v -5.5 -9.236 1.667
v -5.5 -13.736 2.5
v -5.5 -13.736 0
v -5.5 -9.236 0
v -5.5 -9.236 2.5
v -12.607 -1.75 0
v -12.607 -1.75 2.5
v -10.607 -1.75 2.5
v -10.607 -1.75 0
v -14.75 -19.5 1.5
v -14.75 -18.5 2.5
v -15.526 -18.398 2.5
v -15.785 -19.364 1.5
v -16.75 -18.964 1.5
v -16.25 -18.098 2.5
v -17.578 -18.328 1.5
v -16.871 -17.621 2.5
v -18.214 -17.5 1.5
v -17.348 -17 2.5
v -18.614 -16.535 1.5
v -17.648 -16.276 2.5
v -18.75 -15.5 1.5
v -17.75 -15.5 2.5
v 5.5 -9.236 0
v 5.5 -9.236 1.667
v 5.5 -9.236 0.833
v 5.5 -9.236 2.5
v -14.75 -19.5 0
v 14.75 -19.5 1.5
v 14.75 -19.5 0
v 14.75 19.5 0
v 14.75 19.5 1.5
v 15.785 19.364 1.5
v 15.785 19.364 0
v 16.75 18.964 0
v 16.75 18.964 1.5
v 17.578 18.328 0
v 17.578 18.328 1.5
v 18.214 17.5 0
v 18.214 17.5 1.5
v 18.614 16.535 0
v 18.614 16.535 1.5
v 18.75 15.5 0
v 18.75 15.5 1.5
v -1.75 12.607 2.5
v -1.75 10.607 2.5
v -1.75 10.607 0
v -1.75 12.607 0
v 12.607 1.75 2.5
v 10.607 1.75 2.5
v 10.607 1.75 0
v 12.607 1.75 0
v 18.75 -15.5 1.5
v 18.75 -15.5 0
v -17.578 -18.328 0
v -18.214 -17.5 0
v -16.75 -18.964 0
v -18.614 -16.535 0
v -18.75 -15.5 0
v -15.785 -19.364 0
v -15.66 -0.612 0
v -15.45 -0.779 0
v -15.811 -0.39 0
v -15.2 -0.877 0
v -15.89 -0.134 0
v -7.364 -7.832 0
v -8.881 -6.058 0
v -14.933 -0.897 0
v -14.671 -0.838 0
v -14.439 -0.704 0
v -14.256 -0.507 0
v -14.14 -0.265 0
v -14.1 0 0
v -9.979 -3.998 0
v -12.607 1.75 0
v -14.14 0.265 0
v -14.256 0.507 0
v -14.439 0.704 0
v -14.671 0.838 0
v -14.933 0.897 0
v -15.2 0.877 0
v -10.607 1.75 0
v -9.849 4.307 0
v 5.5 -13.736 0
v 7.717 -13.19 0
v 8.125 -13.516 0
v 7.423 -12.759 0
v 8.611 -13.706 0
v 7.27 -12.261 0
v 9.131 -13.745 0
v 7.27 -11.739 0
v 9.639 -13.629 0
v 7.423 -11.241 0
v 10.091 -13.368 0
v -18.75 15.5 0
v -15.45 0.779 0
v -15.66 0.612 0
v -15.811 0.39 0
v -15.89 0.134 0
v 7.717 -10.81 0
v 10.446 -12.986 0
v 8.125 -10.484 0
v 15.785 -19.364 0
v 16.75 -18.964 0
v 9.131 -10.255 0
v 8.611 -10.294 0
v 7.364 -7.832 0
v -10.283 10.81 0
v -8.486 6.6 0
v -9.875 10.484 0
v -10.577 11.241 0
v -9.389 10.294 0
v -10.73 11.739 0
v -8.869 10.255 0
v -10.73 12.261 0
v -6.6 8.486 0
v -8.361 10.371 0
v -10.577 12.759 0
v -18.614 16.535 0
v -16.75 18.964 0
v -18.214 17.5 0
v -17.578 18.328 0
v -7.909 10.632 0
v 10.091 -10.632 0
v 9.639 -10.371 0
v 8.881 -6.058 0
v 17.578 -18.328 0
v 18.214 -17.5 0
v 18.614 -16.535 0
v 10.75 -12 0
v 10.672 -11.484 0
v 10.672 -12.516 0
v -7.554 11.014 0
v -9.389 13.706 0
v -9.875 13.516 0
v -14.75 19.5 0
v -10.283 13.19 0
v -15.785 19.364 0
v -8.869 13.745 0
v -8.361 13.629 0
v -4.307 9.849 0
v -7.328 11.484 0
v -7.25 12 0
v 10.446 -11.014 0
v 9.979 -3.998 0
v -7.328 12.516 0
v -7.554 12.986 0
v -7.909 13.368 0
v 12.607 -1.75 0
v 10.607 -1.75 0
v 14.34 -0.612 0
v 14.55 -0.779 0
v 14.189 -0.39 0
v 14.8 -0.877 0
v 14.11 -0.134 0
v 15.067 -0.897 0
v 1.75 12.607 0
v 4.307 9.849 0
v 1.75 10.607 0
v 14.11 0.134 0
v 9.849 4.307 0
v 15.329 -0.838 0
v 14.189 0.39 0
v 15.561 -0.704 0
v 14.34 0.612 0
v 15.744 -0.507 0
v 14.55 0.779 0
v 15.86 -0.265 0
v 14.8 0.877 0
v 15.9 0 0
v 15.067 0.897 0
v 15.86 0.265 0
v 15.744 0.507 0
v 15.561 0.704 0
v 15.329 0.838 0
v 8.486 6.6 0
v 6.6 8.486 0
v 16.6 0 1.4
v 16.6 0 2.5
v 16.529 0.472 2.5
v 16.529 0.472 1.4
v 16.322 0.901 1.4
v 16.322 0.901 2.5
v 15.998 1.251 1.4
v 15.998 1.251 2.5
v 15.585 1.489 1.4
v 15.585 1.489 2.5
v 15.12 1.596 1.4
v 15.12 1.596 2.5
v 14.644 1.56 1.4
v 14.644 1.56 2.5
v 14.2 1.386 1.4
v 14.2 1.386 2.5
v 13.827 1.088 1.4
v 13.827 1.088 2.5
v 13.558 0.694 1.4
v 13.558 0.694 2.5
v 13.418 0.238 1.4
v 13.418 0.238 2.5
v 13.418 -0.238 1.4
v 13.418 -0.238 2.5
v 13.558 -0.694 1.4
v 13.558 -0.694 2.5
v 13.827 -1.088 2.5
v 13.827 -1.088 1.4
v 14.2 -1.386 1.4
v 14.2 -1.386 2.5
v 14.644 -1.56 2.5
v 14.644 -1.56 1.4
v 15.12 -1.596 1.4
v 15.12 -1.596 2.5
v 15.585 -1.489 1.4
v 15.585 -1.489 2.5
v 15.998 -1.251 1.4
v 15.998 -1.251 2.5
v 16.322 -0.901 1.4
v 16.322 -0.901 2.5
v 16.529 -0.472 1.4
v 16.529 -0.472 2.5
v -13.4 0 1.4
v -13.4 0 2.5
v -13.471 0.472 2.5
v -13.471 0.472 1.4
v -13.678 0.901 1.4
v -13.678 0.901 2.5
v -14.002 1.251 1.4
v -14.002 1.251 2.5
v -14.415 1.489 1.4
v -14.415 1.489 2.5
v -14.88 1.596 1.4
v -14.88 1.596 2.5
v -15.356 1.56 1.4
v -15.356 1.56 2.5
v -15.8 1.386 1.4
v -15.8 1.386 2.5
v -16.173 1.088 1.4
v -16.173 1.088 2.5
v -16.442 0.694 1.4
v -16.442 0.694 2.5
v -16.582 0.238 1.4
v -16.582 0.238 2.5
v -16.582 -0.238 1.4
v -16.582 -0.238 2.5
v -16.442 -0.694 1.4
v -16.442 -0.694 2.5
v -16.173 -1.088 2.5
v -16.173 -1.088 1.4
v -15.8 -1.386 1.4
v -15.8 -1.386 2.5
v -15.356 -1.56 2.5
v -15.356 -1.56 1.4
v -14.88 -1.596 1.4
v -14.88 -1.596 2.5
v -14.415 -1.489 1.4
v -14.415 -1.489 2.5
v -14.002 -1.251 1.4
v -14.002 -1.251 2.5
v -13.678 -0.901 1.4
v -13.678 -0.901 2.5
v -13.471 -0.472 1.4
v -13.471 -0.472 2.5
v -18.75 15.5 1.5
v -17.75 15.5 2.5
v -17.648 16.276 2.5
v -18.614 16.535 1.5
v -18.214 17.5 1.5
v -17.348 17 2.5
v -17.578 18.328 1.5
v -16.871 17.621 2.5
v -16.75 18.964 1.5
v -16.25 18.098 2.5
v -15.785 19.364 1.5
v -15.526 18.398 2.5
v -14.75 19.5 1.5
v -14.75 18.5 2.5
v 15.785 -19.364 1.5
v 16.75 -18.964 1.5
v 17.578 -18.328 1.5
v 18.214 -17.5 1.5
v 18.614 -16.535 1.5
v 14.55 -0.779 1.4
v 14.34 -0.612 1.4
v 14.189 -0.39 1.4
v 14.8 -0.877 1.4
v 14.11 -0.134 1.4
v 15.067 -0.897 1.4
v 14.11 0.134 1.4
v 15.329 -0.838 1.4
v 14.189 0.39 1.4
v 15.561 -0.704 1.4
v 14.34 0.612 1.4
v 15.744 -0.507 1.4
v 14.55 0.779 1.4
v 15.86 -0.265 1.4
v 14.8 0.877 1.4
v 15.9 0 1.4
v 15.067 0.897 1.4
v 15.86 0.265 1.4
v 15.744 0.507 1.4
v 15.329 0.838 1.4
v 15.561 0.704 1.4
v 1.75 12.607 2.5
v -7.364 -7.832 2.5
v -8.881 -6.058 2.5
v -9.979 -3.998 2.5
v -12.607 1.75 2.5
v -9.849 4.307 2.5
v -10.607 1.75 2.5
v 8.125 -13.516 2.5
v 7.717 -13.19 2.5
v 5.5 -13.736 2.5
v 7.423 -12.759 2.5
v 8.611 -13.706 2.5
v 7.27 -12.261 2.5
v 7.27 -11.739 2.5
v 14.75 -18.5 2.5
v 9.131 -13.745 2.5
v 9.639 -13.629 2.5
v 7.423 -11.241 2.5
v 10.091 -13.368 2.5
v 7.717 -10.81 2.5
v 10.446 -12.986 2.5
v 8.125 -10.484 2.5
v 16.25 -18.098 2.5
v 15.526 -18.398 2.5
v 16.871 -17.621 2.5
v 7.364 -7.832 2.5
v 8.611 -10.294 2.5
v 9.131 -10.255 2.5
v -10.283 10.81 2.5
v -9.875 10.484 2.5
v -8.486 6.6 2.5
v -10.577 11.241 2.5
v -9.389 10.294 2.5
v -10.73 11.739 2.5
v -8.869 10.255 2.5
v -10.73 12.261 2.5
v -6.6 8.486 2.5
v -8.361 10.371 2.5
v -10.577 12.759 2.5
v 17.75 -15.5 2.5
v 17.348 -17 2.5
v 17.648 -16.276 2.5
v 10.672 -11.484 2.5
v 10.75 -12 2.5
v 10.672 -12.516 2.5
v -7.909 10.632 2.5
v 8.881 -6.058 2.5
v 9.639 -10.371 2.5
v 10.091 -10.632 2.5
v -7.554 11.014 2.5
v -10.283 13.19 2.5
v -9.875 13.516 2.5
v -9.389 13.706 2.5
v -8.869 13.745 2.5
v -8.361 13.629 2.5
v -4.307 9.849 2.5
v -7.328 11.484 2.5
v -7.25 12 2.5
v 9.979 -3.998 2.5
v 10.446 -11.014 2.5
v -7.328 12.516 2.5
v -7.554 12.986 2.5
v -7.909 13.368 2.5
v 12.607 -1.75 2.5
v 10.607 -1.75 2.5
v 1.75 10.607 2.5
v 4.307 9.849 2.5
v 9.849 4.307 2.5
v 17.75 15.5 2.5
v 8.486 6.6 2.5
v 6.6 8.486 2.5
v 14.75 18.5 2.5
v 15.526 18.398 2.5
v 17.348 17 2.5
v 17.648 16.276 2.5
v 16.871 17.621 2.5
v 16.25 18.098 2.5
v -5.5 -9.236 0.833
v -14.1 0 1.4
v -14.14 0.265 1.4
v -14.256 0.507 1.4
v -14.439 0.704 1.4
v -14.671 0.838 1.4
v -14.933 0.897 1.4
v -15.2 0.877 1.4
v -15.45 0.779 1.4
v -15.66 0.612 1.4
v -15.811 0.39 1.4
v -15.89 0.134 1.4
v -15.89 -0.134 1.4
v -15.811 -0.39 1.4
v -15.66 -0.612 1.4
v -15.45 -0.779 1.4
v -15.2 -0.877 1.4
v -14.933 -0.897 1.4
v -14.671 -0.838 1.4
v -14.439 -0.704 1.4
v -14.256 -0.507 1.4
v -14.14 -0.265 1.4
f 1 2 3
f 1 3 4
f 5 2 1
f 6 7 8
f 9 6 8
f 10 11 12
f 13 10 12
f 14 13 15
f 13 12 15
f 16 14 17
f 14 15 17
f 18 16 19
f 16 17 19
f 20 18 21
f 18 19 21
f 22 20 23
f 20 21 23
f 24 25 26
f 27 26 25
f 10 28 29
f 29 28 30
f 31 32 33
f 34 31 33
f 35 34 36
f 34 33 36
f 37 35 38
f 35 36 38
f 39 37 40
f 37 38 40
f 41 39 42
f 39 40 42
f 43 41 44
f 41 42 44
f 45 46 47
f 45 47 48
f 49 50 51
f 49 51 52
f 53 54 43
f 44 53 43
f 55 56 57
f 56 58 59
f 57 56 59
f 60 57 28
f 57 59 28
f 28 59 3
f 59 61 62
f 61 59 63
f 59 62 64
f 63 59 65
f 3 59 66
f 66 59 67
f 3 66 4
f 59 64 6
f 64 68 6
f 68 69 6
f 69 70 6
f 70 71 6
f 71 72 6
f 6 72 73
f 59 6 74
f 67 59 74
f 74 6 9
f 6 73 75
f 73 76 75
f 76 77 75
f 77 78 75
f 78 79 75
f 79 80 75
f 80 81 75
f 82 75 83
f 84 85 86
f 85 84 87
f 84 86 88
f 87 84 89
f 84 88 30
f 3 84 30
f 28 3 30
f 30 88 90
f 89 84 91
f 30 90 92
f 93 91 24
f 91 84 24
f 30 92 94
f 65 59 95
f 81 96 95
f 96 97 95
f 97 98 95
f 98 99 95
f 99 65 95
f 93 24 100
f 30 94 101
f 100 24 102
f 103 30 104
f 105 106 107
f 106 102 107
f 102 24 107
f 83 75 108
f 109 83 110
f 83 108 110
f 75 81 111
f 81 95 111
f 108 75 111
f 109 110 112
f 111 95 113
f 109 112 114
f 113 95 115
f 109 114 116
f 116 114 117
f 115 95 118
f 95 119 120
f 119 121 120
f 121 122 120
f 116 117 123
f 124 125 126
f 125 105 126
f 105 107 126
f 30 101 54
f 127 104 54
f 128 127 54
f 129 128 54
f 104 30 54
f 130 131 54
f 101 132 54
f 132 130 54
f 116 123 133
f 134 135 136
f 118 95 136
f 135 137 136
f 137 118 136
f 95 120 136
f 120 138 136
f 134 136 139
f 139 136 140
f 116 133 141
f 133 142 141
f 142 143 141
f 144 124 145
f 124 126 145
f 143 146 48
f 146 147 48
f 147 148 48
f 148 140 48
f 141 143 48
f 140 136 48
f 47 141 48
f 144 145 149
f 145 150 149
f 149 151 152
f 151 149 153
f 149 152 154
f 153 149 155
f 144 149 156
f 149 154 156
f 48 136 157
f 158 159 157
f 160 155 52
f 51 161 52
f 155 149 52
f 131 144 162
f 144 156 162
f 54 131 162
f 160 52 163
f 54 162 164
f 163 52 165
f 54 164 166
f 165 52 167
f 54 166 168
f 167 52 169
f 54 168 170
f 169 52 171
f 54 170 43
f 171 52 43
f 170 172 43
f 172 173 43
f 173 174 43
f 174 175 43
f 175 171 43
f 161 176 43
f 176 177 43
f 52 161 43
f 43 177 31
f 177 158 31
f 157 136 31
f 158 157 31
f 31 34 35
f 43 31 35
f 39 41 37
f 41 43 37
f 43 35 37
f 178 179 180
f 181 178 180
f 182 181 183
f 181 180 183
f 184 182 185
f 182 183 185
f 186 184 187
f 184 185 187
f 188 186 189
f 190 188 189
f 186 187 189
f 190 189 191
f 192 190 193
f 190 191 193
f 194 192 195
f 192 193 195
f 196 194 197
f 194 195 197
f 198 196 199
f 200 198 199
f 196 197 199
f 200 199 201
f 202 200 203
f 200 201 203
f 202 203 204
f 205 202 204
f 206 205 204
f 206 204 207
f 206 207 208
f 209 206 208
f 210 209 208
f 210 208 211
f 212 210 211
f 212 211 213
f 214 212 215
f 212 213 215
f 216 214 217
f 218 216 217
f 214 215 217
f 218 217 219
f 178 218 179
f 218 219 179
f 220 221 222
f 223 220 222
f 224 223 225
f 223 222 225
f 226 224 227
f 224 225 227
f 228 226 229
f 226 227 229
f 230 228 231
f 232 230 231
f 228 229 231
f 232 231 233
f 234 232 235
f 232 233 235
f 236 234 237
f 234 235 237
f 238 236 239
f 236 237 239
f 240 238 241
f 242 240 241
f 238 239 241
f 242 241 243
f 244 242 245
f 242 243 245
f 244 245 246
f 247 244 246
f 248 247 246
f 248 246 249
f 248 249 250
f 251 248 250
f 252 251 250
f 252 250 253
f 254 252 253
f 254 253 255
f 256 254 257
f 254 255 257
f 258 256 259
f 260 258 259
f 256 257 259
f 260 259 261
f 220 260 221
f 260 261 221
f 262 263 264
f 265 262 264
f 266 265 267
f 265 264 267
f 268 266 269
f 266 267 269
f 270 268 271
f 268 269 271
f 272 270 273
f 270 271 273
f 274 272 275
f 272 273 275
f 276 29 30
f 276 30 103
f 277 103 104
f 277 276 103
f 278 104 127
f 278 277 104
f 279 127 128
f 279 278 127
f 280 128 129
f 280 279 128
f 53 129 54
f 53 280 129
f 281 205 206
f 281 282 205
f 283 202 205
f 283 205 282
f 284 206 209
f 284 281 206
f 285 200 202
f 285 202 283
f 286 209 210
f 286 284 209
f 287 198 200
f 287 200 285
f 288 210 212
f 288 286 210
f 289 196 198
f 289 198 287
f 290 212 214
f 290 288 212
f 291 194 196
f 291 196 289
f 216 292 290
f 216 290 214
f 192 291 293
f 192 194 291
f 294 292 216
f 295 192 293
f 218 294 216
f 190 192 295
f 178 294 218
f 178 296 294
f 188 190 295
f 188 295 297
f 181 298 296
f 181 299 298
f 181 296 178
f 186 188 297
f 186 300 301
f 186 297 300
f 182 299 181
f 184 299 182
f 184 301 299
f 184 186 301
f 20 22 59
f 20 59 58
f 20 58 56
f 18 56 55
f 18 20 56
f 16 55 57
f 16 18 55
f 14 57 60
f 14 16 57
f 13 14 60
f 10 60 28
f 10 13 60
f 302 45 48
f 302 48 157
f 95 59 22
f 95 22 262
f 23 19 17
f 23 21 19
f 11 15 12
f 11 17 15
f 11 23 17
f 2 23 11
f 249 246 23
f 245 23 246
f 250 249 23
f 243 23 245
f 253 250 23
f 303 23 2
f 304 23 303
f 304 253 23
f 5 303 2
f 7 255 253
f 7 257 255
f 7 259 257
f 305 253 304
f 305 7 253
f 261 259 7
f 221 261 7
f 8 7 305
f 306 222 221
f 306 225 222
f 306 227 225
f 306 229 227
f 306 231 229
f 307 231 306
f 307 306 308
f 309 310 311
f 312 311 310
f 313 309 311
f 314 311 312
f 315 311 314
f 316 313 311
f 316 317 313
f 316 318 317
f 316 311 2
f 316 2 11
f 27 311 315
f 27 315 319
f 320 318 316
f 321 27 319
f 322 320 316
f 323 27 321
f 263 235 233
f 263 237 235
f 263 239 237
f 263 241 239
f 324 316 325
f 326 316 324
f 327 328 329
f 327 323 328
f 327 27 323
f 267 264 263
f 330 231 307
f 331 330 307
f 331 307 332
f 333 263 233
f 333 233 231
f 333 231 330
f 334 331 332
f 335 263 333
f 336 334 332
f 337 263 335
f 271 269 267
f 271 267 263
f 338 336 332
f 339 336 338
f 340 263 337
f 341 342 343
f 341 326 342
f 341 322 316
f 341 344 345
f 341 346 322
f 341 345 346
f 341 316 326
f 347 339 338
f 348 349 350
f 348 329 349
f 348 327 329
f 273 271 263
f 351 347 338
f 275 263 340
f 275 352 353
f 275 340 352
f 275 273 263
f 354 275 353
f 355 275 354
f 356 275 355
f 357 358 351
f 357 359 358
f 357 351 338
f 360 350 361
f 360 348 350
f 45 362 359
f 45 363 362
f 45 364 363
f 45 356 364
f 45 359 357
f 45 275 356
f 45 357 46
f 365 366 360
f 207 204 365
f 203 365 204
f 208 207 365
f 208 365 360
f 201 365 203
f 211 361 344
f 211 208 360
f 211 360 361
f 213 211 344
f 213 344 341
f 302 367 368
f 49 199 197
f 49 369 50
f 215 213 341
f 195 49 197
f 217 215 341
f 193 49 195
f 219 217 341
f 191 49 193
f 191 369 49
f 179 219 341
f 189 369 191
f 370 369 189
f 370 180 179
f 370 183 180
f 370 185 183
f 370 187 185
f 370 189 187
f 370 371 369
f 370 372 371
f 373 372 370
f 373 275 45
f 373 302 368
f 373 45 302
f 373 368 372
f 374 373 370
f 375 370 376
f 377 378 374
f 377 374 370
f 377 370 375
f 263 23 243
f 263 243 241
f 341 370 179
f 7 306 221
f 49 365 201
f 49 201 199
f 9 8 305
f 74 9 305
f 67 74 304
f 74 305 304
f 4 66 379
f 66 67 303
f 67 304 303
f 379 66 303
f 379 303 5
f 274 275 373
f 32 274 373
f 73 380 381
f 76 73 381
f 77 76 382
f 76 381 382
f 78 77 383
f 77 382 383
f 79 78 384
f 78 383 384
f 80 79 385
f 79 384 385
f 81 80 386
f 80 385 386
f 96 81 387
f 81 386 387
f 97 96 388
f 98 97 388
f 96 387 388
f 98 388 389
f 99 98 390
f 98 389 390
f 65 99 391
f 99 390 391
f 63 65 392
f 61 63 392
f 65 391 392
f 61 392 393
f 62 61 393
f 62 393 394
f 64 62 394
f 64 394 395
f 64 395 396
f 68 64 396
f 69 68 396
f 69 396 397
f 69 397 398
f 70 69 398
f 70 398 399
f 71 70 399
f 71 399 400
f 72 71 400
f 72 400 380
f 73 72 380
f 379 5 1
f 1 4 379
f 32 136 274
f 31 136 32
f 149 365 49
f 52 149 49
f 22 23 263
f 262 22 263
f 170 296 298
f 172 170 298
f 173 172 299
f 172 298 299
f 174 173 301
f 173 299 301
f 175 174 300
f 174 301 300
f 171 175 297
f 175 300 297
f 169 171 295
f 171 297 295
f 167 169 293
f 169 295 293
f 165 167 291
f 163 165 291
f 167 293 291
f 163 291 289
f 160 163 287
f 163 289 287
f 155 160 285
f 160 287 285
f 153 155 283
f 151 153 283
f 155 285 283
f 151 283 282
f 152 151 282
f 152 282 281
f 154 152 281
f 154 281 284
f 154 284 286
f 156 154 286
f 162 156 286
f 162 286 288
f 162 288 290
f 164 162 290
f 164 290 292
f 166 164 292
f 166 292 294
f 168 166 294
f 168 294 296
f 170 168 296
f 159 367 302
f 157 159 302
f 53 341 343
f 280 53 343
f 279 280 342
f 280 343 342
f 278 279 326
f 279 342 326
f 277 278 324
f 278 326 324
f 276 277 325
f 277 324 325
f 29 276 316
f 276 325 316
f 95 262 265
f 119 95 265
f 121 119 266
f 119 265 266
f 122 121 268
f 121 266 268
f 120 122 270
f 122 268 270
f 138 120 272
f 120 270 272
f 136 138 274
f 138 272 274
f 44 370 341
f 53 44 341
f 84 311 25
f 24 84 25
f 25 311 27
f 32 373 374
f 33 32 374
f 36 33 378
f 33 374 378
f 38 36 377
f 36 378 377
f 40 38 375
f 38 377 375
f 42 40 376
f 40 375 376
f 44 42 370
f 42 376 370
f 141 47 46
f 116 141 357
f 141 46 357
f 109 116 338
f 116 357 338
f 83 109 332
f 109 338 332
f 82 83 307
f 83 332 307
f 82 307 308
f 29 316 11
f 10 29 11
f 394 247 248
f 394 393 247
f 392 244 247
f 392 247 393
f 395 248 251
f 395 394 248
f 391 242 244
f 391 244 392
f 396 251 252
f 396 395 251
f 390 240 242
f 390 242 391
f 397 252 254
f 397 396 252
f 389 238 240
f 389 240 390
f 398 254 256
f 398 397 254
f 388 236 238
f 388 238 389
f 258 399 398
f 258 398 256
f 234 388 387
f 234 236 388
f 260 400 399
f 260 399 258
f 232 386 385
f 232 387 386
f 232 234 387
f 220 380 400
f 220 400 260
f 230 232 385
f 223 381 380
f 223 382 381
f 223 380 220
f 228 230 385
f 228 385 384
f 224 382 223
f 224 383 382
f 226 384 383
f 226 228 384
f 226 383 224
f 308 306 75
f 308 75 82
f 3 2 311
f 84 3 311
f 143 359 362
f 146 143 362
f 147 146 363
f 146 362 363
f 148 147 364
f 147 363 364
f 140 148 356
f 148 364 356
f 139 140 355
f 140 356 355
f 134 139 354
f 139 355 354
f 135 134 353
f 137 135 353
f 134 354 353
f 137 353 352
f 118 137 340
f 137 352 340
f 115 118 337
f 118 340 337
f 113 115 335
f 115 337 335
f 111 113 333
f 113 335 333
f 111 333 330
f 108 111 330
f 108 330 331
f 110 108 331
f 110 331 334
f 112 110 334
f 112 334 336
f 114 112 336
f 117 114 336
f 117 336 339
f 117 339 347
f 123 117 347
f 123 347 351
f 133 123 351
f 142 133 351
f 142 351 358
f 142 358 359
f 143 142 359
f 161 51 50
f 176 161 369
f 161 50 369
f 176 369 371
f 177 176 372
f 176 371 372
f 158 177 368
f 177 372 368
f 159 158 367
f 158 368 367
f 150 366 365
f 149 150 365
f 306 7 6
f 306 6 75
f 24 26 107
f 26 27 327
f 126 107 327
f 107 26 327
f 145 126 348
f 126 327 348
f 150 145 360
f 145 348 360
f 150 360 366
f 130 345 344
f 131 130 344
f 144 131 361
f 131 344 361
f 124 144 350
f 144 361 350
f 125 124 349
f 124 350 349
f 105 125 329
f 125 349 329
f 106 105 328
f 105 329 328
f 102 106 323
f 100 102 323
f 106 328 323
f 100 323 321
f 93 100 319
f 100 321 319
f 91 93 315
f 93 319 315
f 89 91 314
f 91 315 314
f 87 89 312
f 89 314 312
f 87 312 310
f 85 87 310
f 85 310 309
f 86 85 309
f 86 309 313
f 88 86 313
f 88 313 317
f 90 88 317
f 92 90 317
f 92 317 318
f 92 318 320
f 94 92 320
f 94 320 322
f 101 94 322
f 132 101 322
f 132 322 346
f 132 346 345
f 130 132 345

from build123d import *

# Parameters (mm, degrees)
SKETCH_W        = 37.5
SKETCH_H        = 39
PAD_DEPTH       = 2.5
SKETCH001_R     = 10.75
POCKET_DEPTH    = 5
SKETCH002_R     = 1.75
SKETCH002_W     = 2
SKETCH002_H     = 3.5
SKETCH002_W_2   = 3.5
SKETCH002_H_2   = 2
SKETCH002_W_3   = 11
SKETCH002_H_3   = 4.5
POCKET001_DEPTH = 5
FILLET_R        = 4
SKETCH003_R     = 1.6
POCKET002_DEPTH = 1.1
SKETCH004_R     = 0.9
POCKET003_DEPTH = 5
CHAMFER_SIZE    = 1


with BuildPart() as part:
    # Sketch → Pad (new body)
    with BuildSketch(Plane.XY):
        Rectangle(SKETCH_W, SKETCH_H)
    extrude(amount=PAD_DEPTH)

    # Sketch001 (on Face6 of Pad) → Pocket (cut)
    with BuildSketch(Plane.XY.offset(2.5)):
        Circle(SKETCH001_R)
    extrude(amount=-POCKET_DEPTH, mode=Mode.SUBTRACT)

    # Sketch002 (on Face5 of Pocket) → Pocket001 (cut)
    with BuildSketch(Plane.XY.offset(2.5)):
        with Locations((-9, 12)):
            Circle(SKETCH002_R)
        with Locations((9, -12)):
            Circle(SKETCH002_R)
        with Locations((11.606602, 0)):
            Rectangle(SKETCH002_W, SKETCH002_H)
        with Locations((-11.606602, 0)):
            Rectangle(SKETCH002_W, SKETCH002_H)
        with Locations((0, 11.606602)):
            Rectangle(SKETCH002_W_2, SKETCH002_H_2)
        with Locations((0, -11.486477)):
            Rectangle(SKETCH002_W_3, SKETCH002_H_3)
    extrude(amount=-POCKET001_DEPTH, mode=Mode.SUBTRACT)

    # Fillet
    fillet_edges = [part.edges().sort_by_distance(p)[0] for p in [
        (18.75, -19.5, 1.25),
        (-18.75, -19.5, 1.25),
        (18.75, 19.5, 1.25),
        (-18.75, 19.5, 1.25),
    ]]
    fillet(fillet_edges, radius=FILLET_R)

    # Sketch003 (on Face5 of Fillet) → Pocket002 (cut)
    with BuildSketch(Plane.XY.offset(2.5)):
        with Locations((-15, 0)):
            Circle(SKETCH003_R)
        with Locations((15, 0)):
            Circle(SKETCH003_R)
    extrude(amount=-POCKET002_DEPTH, mode=Mode.SUBTRACT)

    # Sketch004 (on Face31 of Pocket002) → Pocket003 (cut)
    with BuildSketch(Plane.XY.offset(1.4)):
        with Locations((-15, 0)):
            Circle(SKETCH004_R)
        with Locations((15, 0)):
            Circle(SKETCH004_R)
    extrude(amount=-POCKET003_DEPTH, mode=Mode.SUBTRACT)

    # Chamfer
    chamfer_edges = [part.edges().sort_by_distance(p)[0] for p in [
        (-18.75, 0, 2.5),
    ]]
    chamfer(chamfer_edges, length=CHAMFER_SIZE)


solid = part.part
